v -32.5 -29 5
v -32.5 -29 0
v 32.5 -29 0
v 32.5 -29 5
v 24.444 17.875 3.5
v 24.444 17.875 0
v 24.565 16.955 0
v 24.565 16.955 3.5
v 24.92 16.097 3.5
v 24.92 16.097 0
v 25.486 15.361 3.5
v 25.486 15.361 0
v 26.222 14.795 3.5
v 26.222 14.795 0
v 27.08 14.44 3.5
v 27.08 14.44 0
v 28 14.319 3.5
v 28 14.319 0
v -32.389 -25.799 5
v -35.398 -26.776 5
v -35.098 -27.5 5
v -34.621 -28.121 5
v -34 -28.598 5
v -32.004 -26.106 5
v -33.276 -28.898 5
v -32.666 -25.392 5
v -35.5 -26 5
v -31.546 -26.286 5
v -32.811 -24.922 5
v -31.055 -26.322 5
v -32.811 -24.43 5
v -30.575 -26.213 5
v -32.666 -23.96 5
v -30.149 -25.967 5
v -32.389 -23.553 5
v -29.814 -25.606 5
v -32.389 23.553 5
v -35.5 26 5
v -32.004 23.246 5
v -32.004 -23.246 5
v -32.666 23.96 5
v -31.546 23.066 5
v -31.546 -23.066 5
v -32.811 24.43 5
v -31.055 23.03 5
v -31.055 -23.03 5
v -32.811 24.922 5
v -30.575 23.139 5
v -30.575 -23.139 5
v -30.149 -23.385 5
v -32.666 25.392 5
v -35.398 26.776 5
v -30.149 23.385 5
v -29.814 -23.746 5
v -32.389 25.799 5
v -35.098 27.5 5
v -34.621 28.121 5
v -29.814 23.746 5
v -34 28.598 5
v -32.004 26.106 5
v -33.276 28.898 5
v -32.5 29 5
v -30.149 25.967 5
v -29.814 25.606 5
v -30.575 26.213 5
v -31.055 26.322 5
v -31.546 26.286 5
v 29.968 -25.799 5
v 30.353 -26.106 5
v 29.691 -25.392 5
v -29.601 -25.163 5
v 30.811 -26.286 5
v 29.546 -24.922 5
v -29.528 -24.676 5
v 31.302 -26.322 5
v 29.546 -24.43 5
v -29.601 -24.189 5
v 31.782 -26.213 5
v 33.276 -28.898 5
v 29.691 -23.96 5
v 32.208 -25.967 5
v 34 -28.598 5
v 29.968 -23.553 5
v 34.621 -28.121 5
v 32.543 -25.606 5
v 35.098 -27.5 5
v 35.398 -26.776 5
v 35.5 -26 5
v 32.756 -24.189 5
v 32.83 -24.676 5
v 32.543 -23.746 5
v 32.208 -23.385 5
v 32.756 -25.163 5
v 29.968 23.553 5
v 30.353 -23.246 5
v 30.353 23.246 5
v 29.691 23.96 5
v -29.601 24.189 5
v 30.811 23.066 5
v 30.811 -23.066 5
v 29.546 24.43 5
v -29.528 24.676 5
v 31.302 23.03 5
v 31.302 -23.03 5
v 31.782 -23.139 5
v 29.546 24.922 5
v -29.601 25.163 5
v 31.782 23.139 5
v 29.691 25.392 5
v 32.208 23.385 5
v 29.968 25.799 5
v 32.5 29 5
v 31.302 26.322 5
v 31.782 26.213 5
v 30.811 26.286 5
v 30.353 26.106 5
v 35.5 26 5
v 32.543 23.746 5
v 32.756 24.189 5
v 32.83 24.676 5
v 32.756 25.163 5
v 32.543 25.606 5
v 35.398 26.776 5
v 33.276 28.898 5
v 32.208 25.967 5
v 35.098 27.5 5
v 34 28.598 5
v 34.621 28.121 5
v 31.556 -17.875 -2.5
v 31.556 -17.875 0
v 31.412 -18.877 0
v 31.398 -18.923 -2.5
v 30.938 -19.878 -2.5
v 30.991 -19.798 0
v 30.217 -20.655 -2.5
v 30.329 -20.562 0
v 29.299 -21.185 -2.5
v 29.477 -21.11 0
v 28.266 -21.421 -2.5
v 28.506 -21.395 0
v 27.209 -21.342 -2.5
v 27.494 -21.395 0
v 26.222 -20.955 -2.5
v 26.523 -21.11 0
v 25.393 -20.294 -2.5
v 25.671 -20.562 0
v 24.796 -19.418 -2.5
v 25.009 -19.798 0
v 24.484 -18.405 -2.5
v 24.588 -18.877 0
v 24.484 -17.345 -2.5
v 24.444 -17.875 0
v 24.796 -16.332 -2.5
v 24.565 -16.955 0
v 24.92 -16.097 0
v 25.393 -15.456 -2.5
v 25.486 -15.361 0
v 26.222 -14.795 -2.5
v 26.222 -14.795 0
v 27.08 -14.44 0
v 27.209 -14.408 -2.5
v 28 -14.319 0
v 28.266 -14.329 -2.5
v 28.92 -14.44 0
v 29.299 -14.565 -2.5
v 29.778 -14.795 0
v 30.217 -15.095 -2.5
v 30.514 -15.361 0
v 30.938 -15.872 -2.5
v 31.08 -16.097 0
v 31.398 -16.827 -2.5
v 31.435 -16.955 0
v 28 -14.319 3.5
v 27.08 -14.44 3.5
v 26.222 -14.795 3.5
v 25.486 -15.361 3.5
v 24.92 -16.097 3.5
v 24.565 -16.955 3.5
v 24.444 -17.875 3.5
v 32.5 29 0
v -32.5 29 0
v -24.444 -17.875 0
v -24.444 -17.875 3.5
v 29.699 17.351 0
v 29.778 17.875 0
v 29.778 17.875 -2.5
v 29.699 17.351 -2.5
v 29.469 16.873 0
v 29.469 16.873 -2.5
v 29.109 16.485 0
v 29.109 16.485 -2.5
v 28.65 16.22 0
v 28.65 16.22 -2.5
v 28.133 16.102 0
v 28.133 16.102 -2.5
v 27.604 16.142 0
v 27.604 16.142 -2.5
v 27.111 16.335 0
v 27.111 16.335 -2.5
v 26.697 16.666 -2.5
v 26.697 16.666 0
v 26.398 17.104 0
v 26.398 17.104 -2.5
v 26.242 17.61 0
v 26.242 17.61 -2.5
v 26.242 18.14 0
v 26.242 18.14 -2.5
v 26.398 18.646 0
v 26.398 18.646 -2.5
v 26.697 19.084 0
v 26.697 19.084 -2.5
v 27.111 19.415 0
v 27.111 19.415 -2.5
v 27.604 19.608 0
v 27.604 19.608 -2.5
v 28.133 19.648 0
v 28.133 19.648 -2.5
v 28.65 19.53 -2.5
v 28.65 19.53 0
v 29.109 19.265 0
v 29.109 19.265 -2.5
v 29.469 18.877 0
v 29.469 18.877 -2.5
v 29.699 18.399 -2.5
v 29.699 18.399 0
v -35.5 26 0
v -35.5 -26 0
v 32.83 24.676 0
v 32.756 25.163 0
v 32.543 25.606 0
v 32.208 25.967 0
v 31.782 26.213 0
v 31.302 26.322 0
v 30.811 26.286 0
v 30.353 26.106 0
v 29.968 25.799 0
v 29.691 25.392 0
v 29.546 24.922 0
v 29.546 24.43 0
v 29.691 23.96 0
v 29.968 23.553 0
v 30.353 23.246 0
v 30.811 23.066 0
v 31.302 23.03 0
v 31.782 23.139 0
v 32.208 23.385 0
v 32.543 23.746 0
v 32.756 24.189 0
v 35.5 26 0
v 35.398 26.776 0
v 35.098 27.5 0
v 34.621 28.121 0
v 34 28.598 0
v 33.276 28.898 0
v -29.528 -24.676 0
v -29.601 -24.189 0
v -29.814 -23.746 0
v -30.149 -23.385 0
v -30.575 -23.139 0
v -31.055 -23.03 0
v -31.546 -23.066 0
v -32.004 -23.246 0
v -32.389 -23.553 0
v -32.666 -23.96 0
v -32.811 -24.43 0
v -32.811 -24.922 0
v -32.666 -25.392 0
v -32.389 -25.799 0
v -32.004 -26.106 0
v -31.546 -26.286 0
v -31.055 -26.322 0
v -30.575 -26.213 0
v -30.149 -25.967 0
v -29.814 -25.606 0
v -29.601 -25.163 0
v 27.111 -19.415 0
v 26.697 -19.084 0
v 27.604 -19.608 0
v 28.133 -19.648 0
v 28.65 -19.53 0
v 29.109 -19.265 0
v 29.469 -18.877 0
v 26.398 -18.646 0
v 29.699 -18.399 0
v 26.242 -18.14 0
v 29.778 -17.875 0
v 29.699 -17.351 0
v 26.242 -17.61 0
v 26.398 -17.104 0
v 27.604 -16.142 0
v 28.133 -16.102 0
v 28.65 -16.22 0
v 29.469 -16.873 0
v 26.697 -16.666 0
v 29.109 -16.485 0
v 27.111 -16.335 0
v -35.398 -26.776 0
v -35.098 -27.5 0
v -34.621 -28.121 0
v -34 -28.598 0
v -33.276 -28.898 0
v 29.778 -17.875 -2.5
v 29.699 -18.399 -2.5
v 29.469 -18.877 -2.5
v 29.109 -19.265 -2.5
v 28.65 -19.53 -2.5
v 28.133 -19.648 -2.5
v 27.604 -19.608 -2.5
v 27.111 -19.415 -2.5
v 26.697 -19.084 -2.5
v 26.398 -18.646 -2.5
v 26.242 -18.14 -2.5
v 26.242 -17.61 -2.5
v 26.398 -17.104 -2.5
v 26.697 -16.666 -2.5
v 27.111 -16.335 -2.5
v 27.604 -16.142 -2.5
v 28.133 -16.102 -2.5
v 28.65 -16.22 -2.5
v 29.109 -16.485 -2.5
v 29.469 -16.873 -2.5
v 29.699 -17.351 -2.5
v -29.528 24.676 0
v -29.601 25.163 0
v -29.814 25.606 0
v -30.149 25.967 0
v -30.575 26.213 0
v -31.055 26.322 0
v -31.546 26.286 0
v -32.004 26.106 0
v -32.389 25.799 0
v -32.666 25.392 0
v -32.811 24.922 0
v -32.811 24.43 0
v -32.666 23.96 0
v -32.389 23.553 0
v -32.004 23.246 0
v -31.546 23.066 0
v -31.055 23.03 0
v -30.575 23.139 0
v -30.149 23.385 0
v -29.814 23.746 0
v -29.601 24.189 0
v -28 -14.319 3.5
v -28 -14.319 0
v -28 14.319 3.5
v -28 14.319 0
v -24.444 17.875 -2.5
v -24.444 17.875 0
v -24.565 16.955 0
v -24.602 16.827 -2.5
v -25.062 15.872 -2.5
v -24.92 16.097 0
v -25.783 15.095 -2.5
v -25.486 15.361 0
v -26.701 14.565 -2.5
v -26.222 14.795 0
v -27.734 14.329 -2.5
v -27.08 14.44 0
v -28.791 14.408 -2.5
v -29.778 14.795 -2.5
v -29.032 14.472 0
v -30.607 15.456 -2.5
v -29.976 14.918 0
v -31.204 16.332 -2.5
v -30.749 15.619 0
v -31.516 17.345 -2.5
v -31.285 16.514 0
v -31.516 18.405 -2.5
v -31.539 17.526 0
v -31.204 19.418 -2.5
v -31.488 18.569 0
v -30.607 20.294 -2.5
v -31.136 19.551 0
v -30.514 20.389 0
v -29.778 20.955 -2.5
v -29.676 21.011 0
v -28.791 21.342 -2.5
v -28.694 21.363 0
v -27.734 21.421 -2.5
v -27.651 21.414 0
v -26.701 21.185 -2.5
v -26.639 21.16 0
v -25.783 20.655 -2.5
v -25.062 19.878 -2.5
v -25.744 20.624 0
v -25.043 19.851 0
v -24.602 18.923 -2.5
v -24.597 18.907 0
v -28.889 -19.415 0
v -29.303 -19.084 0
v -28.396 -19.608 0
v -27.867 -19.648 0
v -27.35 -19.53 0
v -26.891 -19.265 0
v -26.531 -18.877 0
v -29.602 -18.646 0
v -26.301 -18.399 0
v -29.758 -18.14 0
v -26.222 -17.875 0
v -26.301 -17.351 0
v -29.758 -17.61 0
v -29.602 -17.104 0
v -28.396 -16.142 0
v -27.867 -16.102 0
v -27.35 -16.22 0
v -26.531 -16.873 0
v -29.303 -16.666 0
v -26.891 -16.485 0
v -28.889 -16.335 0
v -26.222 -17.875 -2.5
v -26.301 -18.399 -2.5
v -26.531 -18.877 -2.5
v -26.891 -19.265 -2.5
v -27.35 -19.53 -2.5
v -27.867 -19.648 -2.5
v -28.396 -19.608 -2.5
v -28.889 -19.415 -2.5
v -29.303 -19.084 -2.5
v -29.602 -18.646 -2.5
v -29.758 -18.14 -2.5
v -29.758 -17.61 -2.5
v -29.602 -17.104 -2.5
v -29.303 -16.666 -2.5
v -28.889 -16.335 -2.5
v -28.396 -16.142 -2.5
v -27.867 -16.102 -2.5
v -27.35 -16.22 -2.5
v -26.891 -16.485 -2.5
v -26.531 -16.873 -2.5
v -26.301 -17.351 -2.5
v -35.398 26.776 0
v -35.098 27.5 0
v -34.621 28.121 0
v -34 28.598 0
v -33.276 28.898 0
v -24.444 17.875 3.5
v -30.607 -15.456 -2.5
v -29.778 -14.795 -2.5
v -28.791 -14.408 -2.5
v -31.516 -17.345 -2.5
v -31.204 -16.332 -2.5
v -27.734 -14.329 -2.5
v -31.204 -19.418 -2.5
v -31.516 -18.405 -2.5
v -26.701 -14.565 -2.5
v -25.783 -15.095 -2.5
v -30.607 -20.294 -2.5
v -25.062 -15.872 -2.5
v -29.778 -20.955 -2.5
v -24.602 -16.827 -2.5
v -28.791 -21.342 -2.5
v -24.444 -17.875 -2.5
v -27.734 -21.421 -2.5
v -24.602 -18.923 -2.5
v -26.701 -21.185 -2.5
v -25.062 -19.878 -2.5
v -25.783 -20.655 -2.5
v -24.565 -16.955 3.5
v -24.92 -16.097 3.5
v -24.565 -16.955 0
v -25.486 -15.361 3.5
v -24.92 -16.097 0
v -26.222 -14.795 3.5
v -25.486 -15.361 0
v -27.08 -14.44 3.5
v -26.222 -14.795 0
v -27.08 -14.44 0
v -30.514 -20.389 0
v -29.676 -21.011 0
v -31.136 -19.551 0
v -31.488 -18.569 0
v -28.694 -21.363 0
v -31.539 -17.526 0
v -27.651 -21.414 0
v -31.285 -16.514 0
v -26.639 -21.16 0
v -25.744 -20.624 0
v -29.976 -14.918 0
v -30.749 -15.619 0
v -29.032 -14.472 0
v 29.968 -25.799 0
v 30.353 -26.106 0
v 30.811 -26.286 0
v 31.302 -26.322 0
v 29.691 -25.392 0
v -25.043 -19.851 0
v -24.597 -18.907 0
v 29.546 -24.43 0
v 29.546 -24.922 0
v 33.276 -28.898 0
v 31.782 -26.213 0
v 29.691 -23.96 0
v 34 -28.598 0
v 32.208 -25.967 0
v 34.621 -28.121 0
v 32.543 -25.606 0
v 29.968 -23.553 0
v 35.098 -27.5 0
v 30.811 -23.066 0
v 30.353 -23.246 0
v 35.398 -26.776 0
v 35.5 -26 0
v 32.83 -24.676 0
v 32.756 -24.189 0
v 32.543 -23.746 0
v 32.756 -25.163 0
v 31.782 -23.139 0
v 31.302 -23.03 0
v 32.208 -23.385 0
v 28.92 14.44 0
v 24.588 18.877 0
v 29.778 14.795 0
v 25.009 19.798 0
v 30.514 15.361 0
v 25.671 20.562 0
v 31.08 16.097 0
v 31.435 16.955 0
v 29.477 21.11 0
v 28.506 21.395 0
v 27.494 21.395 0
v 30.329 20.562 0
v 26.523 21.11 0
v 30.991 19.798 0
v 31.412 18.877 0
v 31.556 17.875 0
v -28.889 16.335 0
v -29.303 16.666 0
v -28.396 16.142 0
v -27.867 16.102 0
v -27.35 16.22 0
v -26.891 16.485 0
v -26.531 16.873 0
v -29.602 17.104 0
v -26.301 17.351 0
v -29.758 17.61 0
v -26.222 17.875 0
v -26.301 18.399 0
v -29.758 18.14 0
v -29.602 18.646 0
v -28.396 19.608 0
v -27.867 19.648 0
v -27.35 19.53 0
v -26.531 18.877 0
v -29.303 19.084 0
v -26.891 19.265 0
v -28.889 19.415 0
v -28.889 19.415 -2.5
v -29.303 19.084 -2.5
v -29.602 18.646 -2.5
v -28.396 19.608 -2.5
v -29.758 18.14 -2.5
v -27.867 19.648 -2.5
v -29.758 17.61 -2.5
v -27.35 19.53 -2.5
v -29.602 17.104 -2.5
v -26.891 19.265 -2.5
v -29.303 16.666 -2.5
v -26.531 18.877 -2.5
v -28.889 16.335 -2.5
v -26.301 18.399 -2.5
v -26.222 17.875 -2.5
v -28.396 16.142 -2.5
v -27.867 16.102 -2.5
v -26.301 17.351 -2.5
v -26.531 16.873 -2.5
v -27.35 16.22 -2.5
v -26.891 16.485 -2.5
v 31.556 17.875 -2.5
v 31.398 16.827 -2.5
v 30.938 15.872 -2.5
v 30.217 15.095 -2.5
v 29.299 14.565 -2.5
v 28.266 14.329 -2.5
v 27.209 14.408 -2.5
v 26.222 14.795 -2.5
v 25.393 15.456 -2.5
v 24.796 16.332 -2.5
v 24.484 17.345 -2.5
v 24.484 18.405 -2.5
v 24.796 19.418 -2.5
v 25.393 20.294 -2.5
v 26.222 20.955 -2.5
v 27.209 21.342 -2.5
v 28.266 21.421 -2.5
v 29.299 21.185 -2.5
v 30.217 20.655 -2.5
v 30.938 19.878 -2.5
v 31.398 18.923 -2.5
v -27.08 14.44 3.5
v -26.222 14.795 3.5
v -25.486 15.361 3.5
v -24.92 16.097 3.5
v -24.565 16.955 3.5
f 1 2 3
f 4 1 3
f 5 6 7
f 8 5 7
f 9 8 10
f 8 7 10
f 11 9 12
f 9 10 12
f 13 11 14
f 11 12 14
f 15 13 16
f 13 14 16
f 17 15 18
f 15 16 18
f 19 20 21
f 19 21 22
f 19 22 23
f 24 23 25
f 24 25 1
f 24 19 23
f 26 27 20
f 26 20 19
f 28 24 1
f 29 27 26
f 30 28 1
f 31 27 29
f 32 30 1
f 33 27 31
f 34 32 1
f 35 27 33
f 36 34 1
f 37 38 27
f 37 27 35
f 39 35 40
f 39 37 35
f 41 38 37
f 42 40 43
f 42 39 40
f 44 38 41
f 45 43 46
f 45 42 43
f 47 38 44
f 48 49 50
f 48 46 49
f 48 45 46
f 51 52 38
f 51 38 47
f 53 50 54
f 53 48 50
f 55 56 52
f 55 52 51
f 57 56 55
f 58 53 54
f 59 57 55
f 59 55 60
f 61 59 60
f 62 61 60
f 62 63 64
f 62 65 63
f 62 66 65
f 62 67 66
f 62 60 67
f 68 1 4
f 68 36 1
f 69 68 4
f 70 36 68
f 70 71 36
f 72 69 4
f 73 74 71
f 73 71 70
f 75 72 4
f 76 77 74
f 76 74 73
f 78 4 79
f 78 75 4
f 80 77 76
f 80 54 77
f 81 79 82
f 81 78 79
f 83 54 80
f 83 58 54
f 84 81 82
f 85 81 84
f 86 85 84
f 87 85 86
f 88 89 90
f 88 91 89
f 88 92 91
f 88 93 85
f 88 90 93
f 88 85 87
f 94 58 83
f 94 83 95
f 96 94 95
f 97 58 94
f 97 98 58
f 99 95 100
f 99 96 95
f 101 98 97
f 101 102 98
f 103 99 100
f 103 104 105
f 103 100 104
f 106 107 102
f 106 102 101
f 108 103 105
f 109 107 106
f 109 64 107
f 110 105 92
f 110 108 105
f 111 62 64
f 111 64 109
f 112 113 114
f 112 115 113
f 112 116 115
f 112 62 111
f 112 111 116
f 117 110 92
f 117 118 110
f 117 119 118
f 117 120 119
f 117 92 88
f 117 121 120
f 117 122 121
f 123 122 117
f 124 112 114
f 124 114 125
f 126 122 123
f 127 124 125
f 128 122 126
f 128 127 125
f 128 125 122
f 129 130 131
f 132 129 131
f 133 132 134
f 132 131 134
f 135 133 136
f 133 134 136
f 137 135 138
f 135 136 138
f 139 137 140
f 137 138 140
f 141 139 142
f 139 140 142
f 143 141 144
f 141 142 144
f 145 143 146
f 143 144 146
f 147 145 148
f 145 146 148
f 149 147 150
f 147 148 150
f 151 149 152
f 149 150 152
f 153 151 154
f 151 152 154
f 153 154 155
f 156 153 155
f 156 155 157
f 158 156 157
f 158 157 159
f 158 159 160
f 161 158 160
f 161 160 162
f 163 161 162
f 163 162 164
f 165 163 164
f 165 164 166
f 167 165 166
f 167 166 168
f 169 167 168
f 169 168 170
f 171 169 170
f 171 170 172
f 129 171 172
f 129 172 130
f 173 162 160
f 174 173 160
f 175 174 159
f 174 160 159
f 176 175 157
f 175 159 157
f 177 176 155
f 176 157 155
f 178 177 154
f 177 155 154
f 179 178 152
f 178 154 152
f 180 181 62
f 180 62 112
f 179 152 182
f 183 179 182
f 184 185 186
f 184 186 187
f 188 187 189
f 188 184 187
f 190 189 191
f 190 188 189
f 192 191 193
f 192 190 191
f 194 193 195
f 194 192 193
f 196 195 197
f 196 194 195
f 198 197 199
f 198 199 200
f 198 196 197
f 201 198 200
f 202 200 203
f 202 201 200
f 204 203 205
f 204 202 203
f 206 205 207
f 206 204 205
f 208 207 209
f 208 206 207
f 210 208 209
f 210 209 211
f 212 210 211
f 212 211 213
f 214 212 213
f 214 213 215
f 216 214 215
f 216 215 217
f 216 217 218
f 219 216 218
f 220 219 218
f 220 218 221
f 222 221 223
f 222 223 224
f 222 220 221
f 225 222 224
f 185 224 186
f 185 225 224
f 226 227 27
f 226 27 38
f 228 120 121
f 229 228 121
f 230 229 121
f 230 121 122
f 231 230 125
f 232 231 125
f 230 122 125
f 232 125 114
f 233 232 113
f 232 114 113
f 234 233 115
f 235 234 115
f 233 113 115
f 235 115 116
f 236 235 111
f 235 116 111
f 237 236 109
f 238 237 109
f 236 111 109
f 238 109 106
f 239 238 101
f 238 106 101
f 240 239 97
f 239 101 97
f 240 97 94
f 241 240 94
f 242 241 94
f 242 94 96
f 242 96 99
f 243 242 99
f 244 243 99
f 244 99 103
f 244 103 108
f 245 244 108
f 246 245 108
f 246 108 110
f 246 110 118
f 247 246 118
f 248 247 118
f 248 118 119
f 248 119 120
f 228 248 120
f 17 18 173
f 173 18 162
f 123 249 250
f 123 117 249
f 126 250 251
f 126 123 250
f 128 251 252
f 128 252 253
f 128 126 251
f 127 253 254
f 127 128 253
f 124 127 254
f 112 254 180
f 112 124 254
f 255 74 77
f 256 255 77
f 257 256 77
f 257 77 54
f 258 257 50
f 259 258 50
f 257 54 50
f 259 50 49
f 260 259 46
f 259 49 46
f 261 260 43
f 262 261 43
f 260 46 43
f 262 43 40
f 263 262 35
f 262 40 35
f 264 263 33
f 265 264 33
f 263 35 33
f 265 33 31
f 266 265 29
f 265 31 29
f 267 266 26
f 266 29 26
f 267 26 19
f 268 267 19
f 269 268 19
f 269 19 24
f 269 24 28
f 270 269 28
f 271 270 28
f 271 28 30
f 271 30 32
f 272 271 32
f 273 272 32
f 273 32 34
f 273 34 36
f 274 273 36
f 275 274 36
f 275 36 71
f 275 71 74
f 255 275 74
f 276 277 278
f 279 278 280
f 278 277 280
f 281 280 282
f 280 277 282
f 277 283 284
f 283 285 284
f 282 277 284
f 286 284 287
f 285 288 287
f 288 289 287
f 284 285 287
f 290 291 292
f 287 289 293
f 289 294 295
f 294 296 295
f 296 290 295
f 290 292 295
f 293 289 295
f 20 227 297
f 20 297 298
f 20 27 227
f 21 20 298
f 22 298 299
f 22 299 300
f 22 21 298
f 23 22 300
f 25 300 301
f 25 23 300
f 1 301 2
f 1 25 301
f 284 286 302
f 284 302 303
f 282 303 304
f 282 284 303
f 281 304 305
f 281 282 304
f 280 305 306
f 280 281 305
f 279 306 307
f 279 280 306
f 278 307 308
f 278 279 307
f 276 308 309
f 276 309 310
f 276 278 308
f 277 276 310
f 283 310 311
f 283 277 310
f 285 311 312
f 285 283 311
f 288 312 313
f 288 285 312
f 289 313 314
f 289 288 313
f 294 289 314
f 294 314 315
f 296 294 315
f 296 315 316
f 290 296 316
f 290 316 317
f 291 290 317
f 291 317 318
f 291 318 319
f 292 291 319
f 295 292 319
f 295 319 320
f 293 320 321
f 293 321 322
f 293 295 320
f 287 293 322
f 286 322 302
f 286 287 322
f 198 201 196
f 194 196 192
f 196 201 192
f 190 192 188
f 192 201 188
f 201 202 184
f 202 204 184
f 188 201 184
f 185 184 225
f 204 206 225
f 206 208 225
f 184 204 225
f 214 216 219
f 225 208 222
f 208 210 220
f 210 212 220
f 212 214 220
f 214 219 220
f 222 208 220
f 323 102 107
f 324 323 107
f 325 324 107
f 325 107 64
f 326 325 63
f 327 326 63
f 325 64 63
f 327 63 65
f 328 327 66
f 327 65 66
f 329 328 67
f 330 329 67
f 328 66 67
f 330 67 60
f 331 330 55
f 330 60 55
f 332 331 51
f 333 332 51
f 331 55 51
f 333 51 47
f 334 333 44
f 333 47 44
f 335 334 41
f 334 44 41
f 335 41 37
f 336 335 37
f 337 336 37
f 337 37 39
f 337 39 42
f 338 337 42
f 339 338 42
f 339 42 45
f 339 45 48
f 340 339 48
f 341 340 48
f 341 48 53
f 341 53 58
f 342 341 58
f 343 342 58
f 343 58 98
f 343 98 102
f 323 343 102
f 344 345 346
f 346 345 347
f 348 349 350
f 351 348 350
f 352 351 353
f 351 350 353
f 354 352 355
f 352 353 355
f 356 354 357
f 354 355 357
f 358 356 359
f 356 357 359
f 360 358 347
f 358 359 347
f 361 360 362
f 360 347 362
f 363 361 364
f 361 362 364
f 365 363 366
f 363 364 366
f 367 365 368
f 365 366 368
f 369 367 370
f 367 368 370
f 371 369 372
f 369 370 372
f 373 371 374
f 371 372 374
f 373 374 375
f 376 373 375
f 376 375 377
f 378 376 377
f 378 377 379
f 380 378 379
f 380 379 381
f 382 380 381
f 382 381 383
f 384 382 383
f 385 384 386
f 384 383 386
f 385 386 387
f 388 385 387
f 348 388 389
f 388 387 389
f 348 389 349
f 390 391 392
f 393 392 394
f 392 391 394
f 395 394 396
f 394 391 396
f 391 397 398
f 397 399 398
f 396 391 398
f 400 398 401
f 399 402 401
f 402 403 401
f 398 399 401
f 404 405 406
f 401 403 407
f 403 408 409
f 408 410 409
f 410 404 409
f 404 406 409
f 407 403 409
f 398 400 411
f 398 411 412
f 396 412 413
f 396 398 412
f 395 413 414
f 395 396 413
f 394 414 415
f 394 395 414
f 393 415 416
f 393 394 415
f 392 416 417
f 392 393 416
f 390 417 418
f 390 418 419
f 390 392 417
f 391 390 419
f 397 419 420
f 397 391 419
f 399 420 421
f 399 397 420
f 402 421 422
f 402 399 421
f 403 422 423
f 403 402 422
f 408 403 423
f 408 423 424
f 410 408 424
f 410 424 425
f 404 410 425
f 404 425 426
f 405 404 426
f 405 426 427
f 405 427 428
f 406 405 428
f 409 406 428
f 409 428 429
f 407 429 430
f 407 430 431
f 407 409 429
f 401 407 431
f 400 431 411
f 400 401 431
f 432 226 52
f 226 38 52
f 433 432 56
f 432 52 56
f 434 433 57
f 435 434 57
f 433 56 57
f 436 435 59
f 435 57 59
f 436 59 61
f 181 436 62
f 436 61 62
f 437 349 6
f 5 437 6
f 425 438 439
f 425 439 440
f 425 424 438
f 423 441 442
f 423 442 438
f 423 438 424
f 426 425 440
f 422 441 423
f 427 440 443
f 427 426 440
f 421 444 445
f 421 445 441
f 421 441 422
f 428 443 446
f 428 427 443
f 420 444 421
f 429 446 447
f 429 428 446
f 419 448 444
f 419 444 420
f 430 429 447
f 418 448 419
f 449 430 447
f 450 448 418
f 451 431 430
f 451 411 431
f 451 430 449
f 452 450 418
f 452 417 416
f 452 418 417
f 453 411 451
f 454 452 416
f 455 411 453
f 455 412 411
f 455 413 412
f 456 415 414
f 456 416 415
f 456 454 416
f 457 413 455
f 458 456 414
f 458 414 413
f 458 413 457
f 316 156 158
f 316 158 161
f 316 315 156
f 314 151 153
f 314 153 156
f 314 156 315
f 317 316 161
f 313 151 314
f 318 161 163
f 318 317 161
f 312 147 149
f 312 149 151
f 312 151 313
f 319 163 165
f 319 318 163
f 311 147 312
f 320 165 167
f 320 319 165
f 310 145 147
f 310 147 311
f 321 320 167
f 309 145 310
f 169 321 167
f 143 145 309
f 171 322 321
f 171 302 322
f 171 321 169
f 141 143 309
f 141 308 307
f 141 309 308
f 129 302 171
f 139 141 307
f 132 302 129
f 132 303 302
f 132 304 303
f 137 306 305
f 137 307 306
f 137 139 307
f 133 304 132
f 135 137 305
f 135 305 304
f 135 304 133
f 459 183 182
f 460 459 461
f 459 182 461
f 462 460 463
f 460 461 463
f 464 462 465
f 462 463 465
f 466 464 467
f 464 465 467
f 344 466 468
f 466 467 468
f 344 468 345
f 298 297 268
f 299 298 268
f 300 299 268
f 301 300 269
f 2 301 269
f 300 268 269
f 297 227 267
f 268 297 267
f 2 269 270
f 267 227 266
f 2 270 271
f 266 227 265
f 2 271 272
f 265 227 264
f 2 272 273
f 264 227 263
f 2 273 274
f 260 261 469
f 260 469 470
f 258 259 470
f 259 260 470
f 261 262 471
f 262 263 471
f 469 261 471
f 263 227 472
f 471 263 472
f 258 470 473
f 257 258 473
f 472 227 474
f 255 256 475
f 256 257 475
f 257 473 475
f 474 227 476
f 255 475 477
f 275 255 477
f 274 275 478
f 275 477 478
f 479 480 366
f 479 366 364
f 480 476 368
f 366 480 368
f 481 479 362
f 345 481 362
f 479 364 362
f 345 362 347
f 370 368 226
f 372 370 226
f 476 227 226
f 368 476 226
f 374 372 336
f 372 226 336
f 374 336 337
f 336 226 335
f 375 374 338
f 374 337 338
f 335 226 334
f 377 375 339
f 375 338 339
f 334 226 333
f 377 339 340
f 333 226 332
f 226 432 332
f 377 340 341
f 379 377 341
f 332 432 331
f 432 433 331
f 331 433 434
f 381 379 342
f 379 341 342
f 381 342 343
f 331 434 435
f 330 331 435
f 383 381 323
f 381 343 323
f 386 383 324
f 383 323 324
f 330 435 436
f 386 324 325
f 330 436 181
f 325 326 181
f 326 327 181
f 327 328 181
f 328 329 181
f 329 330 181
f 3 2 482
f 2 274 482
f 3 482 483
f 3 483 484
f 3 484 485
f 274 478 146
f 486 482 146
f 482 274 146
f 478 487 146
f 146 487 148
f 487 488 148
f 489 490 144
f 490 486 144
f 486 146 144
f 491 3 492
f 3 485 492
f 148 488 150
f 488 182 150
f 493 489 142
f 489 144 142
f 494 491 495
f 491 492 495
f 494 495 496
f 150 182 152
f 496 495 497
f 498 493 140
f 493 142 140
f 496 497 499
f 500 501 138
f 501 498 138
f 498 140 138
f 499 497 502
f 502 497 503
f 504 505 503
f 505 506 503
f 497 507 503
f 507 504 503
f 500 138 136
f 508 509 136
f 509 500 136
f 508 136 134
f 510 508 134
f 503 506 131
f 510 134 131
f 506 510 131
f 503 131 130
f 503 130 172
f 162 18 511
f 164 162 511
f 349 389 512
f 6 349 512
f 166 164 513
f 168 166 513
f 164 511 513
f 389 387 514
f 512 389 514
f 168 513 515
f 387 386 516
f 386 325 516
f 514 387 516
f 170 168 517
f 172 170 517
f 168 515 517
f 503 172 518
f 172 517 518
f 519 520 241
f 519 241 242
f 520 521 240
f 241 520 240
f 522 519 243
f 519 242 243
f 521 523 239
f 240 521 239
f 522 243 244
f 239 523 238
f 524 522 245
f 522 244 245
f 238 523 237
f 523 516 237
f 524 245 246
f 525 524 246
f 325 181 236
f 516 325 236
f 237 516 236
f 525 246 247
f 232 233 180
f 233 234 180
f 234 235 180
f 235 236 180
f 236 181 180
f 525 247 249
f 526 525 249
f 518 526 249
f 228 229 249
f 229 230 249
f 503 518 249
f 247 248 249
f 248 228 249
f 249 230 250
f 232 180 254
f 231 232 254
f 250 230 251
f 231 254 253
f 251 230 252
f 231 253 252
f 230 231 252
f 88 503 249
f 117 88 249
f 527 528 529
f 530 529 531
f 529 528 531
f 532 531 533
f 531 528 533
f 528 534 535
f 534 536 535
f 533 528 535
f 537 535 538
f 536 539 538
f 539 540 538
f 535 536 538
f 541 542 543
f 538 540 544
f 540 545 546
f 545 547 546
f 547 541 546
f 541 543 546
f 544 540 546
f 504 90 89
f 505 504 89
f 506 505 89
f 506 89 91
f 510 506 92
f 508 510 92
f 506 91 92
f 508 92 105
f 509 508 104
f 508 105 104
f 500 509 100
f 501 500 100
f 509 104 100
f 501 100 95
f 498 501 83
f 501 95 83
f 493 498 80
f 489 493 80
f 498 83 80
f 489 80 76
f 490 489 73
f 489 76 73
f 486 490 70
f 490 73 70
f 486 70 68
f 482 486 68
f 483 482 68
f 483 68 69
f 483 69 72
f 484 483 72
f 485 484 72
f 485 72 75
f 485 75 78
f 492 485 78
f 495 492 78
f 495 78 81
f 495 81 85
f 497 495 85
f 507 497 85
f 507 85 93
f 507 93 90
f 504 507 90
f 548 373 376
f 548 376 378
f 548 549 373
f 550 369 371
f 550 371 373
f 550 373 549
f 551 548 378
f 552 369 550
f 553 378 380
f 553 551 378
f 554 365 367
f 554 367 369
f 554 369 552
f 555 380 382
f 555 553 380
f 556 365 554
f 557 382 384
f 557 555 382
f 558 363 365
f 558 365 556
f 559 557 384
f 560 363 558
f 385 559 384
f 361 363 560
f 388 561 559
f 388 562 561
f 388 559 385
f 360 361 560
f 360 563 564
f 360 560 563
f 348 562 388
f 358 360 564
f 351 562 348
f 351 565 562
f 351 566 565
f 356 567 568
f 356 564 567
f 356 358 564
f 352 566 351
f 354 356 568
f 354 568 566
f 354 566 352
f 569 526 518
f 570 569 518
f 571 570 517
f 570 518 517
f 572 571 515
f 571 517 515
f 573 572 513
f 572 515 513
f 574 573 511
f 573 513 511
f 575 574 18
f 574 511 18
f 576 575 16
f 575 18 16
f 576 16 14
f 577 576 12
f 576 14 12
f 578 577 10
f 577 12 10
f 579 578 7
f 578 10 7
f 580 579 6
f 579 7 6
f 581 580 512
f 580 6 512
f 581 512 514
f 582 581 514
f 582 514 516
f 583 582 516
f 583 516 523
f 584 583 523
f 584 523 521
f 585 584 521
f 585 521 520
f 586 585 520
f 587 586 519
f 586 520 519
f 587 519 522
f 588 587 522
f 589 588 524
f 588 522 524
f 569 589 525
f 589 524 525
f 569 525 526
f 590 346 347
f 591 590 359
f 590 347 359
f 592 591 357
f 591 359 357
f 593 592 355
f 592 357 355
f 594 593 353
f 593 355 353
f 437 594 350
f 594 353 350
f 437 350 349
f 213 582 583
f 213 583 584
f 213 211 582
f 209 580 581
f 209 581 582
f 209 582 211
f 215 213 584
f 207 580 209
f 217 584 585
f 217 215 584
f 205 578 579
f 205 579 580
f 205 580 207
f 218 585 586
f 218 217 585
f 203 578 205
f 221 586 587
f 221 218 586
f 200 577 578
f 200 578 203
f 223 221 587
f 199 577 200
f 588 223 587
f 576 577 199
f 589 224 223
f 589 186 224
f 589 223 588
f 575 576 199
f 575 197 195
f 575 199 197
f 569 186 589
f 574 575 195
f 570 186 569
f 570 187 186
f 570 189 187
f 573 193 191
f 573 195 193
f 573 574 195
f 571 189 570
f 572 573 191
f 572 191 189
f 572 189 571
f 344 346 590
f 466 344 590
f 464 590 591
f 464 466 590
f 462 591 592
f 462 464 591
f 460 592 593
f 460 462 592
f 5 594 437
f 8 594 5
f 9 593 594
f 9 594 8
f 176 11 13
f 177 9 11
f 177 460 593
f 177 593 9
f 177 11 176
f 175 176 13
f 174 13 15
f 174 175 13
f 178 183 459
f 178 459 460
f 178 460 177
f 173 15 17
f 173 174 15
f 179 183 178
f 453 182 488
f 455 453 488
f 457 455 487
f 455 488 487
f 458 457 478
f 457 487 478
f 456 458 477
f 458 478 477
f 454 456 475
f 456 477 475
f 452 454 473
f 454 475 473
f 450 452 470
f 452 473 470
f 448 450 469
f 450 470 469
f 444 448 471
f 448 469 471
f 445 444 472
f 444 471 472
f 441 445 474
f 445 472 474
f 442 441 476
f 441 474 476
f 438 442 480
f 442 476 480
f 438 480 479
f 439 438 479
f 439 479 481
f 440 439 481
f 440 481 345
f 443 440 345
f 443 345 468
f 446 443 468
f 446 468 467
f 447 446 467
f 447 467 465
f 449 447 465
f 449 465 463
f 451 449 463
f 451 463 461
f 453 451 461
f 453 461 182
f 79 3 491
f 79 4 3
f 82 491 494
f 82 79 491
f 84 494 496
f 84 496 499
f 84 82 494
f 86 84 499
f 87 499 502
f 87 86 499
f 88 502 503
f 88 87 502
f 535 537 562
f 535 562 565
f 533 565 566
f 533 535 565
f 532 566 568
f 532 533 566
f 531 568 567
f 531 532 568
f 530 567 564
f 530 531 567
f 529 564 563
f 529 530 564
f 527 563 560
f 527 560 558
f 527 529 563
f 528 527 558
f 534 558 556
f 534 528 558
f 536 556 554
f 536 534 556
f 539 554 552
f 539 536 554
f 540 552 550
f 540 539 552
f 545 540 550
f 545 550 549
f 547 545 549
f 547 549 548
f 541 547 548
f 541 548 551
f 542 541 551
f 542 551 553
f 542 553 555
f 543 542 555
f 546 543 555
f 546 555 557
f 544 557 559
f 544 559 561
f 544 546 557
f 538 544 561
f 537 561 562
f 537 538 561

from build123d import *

# Parameters (mm, degrees)
F0_W     = 71
F0_H     = 58
F1_DEPTH = 5.00012
F2_R     = 3
F3_R     = 1.651
F4_DEPTH = 5.00112
F5_R     = 3.556
F5_R_2   = 1.778
F6_DEPTH = 2.5
F8_DEPTH = 3.5


# Not quite as in the source:
# - after a boolean that leaves OpenCascade's solid faulty, fix() repairs it
# - a feature names something its author has since deleted; it is built from what else it names


with BuildPart() as f1:
    # F0 (on Top) → F1 (new body)
    with BuildSketch(Plane.XY):
        Rectangle(F0_W, F0_H)
    extrude(amount=F1_DEPTH)

    # F2
    f2_edges = [f1.edges().sort_by_distance(p)[0] for p in [
        (-35.5, 29, 2.50006),
        (35.5, 29, 2.50006),
        (35.5, -29, 2.50006),
        (-35.5, -29, 2.50006),
    ]]
    fillet(f2_edges, radius=F2_R)

    # F3 (on face) → F4 (cut, through all)
    with BuildSketch(Plane.XY.offset(5.00012)):
        with Locations((-31.1785, 24.6761)):
            Circle(F3_R)
        with Locations((-31.1785, -24.6761)):
            Circle(F3_R)
        with Locations((31.1785, -24.6761)):
            Circle(F3_R)
        with Locations((31.1785, 24.6761)):
            Circle(F3_R)
    extrude(amount=-F4_DEPTH, mode=Mode.SUBTRACT)

    # F5 (on face) → F6 (join)
    with BuildSketch(Plane(origin=(0, 0, 0), x_dir=(1, 0, 0), z_dir=(0, 0, -1))):
        with Locations((-28, 17.875)):
            Circle(F5_R)
        with Locations((-28, 17.875)):
            Circle(F5_R_2, mode=Mode.SUBTRACT)
        with Locations((28, 17.875)):
            Circle(F5_R)
        with Locations((28, 17.875)):
            Circle(F5_R_2, mode=Mode.SUBTRACT)
        with Locations((28, -17.875)):
            Circle(F5_R)
        with Locations((28, -17.875)):
            Circle(F5_R_2, mode=Mode.SUBTRACT)
        with Locations((-28, -17.875)):
            Circle(F5_R)
        with Locations((-28, -17.875)):
            Circle(F5_R_2, mode=Mode.SUBTRACT)
    extrude(amount=F6_DEPTH)

    # F7 (on face) → F8 (cut)
    with BuildSketch(Plane(origin=(0, 0, 0), x_dir=(1, 0, 0), z_dir=(0, 0, -1))):
        with BuildLine():
            ThreePointArc((28, 14.319), (25.4855282861, 15.3605282861), (24.444, 17.875))
            Line((24.444, 17.875), (-24.444, 17.875))
            ThreePointArc((-24.444, 17.875), (-25.4855282861, 15.3605282861), (-28, 14.319))
            Line((-28, 14.319), (-28, -14.319))
            ThreePointArc((-28, -14.319), (-25.4855282861, -15.3605282861), (-24.444, -17.875))
            Line((-24.444, -17.875), (24.444, -17.875))
            ThreePointArc((24.444, -17.875), (25.4855282861, -15.3605282861), (28, -14.319))
            Line((28, -14.319), (28, 14.319))
        make_face()
    extrude(amount=-F8_DEPTH, mode=Mode.SUBTRACT)

    add(f1.part.fix(), mode=Mode.REPLACE)


solid = f1.part
